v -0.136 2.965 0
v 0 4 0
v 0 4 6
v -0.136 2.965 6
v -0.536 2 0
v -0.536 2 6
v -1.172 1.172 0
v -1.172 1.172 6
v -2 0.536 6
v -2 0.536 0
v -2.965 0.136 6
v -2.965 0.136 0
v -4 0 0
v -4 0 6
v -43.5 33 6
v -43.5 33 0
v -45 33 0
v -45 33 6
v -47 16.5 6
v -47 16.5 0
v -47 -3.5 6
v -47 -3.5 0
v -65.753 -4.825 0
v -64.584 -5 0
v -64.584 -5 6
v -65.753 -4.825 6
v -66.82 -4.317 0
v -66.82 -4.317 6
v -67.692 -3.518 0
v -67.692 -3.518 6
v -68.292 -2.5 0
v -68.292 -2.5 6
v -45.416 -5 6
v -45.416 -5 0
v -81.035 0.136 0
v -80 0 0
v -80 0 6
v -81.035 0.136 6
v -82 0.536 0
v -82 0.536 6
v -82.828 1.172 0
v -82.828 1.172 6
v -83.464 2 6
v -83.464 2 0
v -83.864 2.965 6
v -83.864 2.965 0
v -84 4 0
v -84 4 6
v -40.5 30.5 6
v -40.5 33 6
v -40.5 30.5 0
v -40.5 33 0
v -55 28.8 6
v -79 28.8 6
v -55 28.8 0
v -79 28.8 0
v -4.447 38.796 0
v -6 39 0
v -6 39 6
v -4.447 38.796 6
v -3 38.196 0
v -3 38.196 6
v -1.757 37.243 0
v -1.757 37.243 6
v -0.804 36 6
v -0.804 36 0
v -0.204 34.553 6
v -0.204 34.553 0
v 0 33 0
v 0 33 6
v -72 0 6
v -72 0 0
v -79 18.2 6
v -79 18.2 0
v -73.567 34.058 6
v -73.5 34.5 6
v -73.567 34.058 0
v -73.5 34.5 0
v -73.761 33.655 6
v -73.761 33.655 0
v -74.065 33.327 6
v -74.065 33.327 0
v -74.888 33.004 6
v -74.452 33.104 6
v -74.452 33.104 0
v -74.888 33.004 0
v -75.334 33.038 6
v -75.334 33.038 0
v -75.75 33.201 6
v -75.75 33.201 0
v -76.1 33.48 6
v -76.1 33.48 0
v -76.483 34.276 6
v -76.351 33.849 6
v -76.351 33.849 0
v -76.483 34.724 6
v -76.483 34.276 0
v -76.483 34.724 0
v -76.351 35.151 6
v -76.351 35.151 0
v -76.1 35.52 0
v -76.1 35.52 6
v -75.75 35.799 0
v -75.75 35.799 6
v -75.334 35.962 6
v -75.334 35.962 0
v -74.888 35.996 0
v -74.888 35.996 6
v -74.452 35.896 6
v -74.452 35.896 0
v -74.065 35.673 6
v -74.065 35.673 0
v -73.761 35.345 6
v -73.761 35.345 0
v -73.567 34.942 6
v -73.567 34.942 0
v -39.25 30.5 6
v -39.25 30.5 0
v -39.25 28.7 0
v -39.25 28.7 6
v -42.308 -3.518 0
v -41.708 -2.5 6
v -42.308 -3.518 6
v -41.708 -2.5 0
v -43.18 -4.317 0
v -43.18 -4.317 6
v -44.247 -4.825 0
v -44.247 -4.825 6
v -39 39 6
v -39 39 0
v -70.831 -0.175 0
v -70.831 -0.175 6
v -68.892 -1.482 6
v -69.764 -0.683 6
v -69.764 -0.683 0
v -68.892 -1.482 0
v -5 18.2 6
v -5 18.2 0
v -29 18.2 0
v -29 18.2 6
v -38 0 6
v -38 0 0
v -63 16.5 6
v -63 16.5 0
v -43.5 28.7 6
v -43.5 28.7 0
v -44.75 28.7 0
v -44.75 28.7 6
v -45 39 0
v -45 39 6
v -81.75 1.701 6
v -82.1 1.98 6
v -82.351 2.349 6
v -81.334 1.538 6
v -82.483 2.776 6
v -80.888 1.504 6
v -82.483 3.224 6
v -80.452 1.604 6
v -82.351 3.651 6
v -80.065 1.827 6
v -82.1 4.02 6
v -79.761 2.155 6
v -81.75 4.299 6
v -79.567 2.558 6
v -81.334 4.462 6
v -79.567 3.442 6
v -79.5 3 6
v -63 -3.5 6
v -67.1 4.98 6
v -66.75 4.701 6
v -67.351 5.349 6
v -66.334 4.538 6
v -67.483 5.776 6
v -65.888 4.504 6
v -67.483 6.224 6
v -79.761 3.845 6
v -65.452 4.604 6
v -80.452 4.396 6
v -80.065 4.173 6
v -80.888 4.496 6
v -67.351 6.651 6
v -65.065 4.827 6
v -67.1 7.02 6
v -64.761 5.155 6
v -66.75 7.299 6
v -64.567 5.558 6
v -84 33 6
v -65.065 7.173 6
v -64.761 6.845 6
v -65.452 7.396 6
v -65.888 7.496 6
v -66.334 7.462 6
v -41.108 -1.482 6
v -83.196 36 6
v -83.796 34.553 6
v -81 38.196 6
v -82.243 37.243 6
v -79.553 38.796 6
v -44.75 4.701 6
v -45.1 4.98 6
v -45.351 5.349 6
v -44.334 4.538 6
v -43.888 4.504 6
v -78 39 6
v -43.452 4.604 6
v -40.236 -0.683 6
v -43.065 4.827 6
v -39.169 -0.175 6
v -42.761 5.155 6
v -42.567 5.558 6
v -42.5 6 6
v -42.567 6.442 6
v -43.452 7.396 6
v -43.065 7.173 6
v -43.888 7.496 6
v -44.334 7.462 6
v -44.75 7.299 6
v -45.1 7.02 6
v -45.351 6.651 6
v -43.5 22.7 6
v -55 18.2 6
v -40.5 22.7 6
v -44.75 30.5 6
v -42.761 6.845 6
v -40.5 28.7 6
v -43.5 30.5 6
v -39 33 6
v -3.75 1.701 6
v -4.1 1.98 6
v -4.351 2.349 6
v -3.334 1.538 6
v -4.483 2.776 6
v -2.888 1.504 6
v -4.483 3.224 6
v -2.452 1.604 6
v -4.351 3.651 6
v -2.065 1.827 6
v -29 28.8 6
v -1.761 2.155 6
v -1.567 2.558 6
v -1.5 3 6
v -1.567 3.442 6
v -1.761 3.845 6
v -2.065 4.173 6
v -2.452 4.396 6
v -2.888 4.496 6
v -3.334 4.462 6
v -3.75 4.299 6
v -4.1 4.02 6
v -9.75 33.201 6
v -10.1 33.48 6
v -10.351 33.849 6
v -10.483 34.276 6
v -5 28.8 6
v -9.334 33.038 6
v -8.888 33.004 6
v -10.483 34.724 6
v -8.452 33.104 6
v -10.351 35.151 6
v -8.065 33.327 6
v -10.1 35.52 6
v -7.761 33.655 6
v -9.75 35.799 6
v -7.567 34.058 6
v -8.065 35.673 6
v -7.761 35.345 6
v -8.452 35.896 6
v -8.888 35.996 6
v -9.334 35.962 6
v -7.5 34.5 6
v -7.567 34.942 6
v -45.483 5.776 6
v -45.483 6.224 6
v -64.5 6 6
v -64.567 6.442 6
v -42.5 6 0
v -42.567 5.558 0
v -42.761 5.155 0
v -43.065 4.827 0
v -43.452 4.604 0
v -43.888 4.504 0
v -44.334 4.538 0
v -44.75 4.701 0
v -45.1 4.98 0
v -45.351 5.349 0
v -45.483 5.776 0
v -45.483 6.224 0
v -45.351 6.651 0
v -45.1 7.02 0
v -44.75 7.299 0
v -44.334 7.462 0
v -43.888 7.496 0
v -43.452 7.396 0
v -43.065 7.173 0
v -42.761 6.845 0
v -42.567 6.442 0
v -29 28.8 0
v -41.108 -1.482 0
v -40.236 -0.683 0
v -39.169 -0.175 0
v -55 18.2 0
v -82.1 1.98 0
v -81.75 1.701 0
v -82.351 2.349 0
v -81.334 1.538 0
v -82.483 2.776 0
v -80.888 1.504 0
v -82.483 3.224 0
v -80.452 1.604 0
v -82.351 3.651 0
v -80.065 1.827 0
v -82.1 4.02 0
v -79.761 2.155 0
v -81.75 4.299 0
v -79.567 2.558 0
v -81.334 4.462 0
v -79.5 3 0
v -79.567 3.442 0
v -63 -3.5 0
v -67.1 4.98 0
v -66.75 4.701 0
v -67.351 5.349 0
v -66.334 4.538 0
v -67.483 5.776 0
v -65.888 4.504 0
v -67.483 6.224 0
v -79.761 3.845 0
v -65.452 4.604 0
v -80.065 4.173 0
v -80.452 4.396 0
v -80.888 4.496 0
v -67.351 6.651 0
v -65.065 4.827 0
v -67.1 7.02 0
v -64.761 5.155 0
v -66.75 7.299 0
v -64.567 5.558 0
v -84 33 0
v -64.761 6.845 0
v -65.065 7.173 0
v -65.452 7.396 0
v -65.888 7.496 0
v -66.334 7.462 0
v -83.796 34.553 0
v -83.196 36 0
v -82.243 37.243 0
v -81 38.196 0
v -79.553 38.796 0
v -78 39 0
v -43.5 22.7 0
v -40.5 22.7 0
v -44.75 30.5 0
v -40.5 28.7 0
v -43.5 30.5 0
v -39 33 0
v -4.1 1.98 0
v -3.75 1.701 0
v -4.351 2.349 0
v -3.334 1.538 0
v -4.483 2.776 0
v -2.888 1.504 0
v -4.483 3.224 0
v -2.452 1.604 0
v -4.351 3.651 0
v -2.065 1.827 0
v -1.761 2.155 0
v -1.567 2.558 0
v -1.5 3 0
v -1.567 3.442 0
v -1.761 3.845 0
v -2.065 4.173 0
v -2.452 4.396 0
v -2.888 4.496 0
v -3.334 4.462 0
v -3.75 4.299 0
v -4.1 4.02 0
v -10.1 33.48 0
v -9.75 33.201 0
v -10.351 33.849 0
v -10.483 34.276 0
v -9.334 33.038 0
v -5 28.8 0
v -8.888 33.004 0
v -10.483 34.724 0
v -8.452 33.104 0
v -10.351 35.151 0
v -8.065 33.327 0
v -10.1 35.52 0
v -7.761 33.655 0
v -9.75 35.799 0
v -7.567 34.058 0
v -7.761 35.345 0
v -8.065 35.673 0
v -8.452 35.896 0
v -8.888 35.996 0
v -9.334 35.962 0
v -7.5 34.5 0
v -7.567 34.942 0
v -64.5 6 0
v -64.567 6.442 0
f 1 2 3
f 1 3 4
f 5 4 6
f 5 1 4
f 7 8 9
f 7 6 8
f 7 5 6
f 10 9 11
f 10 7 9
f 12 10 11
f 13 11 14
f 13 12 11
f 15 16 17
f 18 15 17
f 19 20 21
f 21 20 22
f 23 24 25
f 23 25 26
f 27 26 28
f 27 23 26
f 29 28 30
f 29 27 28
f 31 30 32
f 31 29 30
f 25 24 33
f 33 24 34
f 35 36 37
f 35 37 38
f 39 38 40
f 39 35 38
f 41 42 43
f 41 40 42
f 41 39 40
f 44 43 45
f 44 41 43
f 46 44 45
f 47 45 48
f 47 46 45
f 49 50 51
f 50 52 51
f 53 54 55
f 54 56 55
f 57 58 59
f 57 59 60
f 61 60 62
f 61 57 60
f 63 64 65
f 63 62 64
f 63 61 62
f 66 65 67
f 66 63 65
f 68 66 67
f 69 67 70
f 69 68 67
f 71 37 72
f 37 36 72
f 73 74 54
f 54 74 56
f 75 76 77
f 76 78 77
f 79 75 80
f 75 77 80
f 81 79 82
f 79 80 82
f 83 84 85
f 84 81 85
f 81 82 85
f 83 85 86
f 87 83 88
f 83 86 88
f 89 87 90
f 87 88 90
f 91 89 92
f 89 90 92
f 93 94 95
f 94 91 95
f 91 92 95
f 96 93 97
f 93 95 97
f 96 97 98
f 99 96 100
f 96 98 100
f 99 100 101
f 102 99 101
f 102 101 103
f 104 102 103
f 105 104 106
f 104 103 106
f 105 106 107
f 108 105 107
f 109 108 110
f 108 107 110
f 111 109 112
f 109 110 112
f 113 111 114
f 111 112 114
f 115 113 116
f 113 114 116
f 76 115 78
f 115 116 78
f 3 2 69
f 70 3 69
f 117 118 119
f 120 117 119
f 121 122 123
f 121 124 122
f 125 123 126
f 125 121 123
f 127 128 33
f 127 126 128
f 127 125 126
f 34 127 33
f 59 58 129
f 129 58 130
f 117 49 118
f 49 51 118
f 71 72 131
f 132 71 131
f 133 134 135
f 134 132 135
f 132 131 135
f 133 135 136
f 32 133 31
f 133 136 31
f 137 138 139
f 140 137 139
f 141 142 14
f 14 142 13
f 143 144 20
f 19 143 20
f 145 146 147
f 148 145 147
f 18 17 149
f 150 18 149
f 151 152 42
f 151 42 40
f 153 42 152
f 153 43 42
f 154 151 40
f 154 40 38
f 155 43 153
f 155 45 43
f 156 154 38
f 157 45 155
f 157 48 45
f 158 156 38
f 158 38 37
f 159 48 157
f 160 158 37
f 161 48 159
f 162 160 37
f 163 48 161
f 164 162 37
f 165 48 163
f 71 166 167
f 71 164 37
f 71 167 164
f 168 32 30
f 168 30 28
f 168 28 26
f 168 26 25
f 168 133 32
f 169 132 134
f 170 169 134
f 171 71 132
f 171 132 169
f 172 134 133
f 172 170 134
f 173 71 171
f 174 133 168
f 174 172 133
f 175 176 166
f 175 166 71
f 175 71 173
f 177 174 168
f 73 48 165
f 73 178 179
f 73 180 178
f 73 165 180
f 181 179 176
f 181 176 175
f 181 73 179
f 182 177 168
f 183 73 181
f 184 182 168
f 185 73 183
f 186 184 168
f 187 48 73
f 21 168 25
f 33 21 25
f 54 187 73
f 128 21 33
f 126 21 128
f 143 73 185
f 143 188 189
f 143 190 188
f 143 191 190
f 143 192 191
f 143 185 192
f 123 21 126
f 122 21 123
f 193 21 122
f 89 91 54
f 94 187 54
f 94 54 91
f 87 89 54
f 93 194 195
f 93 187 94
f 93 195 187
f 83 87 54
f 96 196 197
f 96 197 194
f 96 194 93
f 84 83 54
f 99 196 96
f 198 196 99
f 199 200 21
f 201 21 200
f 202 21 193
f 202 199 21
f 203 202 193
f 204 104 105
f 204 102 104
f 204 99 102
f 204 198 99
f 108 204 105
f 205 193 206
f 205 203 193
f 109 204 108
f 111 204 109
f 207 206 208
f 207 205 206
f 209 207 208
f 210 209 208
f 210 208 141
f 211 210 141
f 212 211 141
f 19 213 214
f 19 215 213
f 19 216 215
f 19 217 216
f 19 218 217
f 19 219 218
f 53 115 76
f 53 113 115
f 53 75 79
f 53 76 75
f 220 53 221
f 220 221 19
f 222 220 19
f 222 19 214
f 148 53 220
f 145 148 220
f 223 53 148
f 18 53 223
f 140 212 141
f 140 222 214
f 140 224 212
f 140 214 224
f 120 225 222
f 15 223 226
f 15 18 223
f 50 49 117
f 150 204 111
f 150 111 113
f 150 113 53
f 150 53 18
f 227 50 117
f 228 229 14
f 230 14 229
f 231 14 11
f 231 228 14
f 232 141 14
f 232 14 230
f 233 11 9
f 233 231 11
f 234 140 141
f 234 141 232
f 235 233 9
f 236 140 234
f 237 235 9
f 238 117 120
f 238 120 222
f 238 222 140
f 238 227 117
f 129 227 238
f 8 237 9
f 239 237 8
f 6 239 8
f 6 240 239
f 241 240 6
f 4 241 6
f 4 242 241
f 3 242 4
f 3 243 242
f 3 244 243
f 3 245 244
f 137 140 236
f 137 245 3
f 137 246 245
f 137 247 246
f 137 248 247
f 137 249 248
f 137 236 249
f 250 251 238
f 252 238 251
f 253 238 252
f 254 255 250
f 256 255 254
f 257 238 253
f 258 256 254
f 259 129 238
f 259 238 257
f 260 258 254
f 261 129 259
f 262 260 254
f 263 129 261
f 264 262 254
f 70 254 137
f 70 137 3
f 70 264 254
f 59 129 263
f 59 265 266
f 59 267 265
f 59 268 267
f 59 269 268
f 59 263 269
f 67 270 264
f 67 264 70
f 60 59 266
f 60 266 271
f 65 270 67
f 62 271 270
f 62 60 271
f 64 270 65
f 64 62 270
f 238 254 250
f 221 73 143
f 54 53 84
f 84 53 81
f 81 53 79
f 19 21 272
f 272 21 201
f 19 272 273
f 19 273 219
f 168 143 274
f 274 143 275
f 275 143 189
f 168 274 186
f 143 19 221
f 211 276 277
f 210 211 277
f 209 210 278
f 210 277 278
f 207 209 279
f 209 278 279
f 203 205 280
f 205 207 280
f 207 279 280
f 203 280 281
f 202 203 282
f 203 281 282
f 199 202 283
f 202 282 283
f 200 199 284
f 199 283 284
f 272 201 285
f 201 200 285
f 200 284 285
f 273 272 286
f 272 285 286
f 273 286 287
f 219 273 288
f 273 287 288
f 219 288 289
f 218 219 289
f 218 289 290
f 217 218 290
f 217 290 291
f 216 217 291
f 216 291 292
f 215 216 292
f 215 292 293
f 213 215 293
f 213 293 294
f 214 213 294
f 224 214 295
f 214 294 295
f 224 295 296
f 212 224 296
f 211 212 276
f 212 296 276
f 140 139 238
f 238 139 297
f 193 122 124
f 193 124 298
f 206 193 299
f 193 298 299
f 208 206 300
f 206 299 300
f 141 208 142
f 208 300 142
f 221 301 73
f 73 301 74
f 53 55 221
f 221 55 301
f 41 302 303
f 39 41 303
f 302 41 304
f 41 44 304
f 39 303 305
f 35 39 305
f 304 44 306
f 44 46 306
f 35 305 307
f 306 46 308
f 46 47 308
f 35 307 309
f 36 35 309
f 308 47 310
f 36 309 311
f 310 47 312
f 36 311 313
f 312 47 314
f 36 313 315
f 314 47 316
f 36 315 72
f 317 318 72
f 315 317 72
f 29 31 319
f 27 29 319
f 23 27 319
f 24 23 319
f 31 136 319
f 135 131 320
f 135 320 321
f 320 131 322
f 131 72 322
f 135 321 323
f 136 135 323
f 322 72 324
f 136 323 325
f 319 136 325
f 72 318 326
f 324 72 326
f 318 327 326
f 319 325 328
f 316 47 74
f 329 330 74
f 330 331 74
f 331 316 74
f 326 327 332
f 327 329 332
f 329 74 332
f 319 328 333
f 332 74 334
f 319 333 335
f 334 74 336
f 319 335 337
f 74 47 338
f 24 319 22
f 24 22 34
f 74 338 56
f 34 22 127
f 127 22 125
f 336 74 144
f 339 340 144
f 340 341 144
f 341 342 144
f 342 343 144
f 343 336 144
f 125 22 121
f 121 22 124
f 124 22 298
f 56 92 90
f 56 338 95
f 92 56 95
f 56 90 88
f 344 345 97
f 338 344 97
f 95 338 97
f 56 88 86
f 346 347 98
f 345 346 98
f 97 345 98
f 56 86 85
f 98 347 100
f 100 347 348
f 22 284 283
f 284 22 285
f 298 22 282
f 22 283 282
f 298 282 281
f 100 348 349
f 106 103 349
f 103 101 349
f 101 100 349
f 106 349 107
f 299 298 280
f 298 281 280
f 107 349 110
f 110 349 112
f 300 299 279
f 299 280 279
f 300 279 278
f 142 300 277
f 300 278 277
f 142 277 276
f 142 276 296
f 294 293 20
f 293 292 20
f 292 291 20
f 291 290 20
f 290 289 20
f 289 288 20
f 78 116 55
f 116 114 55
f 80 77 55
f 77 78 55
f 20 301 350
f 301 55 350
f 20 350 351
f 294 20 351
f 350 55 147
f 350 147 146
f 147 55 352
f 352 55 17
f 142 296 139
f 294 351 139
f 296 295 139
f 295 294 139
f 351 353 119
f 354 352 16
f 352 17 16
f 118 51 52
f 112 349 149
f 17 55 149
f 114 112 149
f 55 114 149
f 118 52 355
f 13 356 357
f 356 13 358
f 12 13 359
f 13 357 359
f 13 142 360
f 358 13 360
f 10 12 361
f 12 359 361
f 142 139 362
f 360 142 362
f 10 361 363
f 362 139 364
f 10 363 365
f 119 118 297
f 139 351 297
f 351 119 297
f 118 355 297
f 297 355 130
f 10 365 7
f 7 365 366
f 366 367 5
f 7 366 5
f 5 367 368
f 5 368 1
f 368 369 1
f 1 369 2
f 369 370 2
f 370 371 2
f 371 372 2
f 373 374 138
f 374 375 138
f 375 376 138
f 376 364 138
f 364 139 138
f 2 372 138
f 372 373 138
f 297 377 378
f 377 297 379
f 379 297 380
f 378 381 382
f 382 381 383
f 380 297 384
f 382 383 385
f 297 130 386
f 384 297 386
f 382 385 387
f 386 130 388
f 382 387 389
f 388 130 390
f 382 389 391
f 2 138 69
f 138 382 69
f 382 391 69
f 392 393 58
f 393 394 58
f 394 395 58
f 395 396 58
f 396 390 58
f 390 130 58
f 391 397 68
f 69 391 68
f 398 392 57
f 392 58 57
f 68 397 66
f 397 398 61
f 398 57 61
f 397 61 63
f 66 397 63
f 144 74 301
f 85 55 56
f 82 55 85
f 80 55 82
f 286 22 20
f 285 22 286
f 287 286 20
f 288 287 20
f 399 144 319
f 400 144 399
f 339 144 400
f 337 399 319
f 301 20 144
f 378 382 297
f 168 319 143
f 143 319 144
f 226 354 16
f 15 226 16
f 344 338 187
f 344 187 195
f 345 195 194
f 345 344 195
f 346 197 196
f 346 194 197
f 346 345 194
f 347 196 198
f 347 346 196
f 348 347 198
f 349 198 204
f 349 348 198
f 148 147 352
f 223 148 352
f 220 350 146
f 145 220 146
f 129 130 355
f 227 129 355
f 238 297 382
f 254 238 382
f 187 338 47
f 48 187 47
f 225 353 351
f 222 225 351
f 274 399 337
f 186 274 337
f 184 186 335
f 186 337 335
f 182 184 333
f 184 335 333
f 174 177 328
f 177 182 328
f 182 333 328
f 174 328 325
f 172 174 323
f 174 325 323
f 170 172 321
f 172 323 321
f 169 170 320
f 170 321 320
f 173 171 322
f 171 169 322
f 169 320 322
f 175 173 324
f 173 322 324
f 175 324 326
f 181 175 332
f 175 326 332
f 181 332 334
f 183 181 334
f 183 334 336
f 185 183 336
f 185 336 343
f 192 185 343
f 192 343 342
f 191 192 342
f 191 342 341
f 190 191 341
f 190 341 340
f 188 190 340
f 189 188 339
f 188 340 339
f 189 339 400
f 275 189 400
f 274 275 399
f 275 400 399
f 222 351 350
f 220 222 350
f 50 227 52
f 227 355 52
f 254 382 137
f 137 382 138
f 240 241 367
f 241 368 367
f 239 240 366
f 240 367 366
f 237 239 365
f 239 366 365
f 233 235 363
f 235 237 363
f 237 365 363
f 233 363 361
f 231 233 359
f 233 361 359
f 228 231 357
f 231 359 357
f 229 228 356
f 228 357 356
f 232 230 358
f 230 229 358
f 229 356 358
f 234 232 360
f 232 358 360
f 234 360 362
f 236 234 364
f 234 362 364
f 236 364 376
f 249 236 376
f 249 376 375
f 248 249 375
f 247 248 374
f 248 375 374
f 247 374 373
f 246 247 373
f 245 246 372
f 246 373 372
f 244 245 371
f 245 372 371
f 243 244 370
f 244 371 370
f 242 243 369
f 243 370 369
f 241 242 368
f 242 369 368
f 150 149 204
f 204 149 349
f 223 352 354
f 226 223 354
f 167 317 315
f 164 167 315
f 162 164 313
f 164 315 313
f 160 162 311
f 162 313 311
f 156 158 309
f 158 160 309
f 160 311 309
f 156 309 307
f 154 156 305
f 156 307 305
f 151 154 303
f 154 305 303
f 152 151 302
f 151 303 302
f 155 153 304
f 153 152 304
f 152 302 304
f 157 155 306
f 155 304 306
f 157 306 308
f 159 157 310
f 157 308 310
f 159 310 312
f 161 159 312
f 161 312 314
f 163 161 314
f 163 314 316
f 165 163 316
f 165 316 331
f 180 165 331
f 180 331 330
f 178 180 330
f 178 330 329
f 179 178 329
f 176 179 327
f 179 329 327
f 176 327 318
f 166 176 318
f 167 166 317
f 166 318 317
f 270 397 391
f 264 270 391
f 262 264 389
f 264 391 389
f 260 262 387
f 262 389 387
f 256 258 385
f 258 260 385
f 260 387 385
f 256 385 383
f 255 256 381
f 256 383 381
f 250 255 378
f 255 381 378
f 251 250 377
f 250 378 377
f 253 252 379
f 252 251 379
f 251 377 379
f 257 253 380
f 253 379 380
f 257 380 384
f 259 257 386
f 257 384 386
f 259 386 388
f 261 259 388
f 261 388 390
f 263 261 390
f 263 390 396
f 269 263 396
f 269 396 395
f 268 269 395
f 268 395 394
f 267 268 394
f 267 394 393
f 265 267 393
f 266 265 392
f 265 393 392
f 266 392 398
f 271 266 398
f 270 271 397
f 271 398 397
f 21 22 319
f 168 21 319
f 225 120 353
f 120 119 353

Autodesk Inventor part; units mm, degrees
ref_plane "YZ Plane" through (0, 0, 0) normal (1, 0, 0) x (0, 1, 0)
ref_plane "XZ Plane" through (0, 0, 0) normal (0, 1, 0) x (-1, 0, 0)
ref_plane "XY Plane" through (0, 0, 0) normal (0, 0, 1) x (1, 0, 0)
sketch "Sketch1" plane through (0, 0, 0) normal (0, 0, 1) x (1, 0, 0)
  arc A0 (-78, 39) -> (-84, 33) centre (-78, 33) ccw
  line L0 (-84, 33) -> (-84, 4)
  arc A1 (-84, 4) -> (-80, 0) centre (-80, 4) ccw
  line L1 (-80, 0) -> (-72, 0)
  arc A2 (-68.2919, -2.5) -> (-72, 0) centre (-72, -4) ccw
  arc A3 (-68.2919, -2.5) -> (-64.5838, -5) centre (-64.5838, -1) ccw
  line L2 (-64.5838, -5) -> (-45.4162, -5)
  arc A4 (-45.4162, -5) -> (-41.7081, -2.5) centre (-45.4162, -1) ccw
  arc A5 (-38, 0) -> (-41.7081, -2.5) centre (-38, -4) ccw
  line L3 (-38, 0) -> (-4, 0)
  arc A6 (-4, 0) -> (0, 4) centre (-4, 4) ccw
  line L4 (0, 4) -> (0, 33)
  arc A7 (0, 33) -> (-6, 39) centre (-6, 33) ccw
  line L5 (-6, 39) -> (-39, 39)
  line L6 (-39, 39) -> (-39, 33)
  line L7 (-39, 33) -> (-40.5, 33)
  line L8 (-40.5, 33) -> (-40.5, 30.5)
  line L9 (-40.5, 30.5) -> (-39.25, 30.5)
  line L10 (-39.25, 30.5) -> (-39.25, 28.7)
  line L11 (-39.25, 28.7) -> (-40.5, 28.7)
  line L12 (-40.5, 28.7) -> (-40.5, 22.7)
  line L13 (-40.5, 22.7) -> (-43.5, 22.7)
  line L14 (-43.5, 22.7) -> (-43.5, 28.7)
  line L15 (-43.5, 28.7) -> (-44.75, 28.7)
  line L16 (-44.75, 28.7) -> (-44.75, 30.5)
  line L17 (-44.75, 30.5) -> (-43.5, 30.5)
  line L18 (-43.5, 30.5) -> (-43.5, 33)
  line L19 (-43.5, 33) -> (-45, 33)
  line L20 (-45, 33) -> (-45, 39)
  line L21 (-45, 39) -> (-78, 39)
  line L22 (-63, -3.5) -> (-63, 16.5)
  line L23 (-63, 16.5) -> (-47, 16.5)
  line L24 (-47, 16.5) -> (-47, -3.5)
  line L25 (-47, -3.5) -> (-63, -3.5)
  line L26 (-79, 18.2) -> (-79, 28.8)
  line L27 (-79, 28.8) -> (-55, 28.8)
  line L28 (-55, 28.8) -> (-55, 18.2)
  line L29 (-55, 18.2) -> (-79, 18.2)
  line L30 (-29, 18.2) -> (-29, 28.8)
  line L31 (-29, 28.8) -> (-5, 28.8)
  line L32 (-5, 28.8) -> (-5, 18.2)
  line L33 (-5, 18.2) -> (-29, 18.2)
  circle A8 centre (-66, 6) radius 1.5
  circle A9 centre (-44, 6) radius 1.5
  circle A10 centre (-3, 3) radius 1.5
  circle A11 centre (-81, 3) radius 1.5
  circle A12 centre (-75, 34.5) radius 1.5
  circle A13 centre (-9, 34.5) radius 1.5
  point P0 (0, 0)
  point P1 (0, 0)
extrude "Extrusion1" add sketch "Sketch1" along normal blind 6
properties part number "XcrLeft_a"
